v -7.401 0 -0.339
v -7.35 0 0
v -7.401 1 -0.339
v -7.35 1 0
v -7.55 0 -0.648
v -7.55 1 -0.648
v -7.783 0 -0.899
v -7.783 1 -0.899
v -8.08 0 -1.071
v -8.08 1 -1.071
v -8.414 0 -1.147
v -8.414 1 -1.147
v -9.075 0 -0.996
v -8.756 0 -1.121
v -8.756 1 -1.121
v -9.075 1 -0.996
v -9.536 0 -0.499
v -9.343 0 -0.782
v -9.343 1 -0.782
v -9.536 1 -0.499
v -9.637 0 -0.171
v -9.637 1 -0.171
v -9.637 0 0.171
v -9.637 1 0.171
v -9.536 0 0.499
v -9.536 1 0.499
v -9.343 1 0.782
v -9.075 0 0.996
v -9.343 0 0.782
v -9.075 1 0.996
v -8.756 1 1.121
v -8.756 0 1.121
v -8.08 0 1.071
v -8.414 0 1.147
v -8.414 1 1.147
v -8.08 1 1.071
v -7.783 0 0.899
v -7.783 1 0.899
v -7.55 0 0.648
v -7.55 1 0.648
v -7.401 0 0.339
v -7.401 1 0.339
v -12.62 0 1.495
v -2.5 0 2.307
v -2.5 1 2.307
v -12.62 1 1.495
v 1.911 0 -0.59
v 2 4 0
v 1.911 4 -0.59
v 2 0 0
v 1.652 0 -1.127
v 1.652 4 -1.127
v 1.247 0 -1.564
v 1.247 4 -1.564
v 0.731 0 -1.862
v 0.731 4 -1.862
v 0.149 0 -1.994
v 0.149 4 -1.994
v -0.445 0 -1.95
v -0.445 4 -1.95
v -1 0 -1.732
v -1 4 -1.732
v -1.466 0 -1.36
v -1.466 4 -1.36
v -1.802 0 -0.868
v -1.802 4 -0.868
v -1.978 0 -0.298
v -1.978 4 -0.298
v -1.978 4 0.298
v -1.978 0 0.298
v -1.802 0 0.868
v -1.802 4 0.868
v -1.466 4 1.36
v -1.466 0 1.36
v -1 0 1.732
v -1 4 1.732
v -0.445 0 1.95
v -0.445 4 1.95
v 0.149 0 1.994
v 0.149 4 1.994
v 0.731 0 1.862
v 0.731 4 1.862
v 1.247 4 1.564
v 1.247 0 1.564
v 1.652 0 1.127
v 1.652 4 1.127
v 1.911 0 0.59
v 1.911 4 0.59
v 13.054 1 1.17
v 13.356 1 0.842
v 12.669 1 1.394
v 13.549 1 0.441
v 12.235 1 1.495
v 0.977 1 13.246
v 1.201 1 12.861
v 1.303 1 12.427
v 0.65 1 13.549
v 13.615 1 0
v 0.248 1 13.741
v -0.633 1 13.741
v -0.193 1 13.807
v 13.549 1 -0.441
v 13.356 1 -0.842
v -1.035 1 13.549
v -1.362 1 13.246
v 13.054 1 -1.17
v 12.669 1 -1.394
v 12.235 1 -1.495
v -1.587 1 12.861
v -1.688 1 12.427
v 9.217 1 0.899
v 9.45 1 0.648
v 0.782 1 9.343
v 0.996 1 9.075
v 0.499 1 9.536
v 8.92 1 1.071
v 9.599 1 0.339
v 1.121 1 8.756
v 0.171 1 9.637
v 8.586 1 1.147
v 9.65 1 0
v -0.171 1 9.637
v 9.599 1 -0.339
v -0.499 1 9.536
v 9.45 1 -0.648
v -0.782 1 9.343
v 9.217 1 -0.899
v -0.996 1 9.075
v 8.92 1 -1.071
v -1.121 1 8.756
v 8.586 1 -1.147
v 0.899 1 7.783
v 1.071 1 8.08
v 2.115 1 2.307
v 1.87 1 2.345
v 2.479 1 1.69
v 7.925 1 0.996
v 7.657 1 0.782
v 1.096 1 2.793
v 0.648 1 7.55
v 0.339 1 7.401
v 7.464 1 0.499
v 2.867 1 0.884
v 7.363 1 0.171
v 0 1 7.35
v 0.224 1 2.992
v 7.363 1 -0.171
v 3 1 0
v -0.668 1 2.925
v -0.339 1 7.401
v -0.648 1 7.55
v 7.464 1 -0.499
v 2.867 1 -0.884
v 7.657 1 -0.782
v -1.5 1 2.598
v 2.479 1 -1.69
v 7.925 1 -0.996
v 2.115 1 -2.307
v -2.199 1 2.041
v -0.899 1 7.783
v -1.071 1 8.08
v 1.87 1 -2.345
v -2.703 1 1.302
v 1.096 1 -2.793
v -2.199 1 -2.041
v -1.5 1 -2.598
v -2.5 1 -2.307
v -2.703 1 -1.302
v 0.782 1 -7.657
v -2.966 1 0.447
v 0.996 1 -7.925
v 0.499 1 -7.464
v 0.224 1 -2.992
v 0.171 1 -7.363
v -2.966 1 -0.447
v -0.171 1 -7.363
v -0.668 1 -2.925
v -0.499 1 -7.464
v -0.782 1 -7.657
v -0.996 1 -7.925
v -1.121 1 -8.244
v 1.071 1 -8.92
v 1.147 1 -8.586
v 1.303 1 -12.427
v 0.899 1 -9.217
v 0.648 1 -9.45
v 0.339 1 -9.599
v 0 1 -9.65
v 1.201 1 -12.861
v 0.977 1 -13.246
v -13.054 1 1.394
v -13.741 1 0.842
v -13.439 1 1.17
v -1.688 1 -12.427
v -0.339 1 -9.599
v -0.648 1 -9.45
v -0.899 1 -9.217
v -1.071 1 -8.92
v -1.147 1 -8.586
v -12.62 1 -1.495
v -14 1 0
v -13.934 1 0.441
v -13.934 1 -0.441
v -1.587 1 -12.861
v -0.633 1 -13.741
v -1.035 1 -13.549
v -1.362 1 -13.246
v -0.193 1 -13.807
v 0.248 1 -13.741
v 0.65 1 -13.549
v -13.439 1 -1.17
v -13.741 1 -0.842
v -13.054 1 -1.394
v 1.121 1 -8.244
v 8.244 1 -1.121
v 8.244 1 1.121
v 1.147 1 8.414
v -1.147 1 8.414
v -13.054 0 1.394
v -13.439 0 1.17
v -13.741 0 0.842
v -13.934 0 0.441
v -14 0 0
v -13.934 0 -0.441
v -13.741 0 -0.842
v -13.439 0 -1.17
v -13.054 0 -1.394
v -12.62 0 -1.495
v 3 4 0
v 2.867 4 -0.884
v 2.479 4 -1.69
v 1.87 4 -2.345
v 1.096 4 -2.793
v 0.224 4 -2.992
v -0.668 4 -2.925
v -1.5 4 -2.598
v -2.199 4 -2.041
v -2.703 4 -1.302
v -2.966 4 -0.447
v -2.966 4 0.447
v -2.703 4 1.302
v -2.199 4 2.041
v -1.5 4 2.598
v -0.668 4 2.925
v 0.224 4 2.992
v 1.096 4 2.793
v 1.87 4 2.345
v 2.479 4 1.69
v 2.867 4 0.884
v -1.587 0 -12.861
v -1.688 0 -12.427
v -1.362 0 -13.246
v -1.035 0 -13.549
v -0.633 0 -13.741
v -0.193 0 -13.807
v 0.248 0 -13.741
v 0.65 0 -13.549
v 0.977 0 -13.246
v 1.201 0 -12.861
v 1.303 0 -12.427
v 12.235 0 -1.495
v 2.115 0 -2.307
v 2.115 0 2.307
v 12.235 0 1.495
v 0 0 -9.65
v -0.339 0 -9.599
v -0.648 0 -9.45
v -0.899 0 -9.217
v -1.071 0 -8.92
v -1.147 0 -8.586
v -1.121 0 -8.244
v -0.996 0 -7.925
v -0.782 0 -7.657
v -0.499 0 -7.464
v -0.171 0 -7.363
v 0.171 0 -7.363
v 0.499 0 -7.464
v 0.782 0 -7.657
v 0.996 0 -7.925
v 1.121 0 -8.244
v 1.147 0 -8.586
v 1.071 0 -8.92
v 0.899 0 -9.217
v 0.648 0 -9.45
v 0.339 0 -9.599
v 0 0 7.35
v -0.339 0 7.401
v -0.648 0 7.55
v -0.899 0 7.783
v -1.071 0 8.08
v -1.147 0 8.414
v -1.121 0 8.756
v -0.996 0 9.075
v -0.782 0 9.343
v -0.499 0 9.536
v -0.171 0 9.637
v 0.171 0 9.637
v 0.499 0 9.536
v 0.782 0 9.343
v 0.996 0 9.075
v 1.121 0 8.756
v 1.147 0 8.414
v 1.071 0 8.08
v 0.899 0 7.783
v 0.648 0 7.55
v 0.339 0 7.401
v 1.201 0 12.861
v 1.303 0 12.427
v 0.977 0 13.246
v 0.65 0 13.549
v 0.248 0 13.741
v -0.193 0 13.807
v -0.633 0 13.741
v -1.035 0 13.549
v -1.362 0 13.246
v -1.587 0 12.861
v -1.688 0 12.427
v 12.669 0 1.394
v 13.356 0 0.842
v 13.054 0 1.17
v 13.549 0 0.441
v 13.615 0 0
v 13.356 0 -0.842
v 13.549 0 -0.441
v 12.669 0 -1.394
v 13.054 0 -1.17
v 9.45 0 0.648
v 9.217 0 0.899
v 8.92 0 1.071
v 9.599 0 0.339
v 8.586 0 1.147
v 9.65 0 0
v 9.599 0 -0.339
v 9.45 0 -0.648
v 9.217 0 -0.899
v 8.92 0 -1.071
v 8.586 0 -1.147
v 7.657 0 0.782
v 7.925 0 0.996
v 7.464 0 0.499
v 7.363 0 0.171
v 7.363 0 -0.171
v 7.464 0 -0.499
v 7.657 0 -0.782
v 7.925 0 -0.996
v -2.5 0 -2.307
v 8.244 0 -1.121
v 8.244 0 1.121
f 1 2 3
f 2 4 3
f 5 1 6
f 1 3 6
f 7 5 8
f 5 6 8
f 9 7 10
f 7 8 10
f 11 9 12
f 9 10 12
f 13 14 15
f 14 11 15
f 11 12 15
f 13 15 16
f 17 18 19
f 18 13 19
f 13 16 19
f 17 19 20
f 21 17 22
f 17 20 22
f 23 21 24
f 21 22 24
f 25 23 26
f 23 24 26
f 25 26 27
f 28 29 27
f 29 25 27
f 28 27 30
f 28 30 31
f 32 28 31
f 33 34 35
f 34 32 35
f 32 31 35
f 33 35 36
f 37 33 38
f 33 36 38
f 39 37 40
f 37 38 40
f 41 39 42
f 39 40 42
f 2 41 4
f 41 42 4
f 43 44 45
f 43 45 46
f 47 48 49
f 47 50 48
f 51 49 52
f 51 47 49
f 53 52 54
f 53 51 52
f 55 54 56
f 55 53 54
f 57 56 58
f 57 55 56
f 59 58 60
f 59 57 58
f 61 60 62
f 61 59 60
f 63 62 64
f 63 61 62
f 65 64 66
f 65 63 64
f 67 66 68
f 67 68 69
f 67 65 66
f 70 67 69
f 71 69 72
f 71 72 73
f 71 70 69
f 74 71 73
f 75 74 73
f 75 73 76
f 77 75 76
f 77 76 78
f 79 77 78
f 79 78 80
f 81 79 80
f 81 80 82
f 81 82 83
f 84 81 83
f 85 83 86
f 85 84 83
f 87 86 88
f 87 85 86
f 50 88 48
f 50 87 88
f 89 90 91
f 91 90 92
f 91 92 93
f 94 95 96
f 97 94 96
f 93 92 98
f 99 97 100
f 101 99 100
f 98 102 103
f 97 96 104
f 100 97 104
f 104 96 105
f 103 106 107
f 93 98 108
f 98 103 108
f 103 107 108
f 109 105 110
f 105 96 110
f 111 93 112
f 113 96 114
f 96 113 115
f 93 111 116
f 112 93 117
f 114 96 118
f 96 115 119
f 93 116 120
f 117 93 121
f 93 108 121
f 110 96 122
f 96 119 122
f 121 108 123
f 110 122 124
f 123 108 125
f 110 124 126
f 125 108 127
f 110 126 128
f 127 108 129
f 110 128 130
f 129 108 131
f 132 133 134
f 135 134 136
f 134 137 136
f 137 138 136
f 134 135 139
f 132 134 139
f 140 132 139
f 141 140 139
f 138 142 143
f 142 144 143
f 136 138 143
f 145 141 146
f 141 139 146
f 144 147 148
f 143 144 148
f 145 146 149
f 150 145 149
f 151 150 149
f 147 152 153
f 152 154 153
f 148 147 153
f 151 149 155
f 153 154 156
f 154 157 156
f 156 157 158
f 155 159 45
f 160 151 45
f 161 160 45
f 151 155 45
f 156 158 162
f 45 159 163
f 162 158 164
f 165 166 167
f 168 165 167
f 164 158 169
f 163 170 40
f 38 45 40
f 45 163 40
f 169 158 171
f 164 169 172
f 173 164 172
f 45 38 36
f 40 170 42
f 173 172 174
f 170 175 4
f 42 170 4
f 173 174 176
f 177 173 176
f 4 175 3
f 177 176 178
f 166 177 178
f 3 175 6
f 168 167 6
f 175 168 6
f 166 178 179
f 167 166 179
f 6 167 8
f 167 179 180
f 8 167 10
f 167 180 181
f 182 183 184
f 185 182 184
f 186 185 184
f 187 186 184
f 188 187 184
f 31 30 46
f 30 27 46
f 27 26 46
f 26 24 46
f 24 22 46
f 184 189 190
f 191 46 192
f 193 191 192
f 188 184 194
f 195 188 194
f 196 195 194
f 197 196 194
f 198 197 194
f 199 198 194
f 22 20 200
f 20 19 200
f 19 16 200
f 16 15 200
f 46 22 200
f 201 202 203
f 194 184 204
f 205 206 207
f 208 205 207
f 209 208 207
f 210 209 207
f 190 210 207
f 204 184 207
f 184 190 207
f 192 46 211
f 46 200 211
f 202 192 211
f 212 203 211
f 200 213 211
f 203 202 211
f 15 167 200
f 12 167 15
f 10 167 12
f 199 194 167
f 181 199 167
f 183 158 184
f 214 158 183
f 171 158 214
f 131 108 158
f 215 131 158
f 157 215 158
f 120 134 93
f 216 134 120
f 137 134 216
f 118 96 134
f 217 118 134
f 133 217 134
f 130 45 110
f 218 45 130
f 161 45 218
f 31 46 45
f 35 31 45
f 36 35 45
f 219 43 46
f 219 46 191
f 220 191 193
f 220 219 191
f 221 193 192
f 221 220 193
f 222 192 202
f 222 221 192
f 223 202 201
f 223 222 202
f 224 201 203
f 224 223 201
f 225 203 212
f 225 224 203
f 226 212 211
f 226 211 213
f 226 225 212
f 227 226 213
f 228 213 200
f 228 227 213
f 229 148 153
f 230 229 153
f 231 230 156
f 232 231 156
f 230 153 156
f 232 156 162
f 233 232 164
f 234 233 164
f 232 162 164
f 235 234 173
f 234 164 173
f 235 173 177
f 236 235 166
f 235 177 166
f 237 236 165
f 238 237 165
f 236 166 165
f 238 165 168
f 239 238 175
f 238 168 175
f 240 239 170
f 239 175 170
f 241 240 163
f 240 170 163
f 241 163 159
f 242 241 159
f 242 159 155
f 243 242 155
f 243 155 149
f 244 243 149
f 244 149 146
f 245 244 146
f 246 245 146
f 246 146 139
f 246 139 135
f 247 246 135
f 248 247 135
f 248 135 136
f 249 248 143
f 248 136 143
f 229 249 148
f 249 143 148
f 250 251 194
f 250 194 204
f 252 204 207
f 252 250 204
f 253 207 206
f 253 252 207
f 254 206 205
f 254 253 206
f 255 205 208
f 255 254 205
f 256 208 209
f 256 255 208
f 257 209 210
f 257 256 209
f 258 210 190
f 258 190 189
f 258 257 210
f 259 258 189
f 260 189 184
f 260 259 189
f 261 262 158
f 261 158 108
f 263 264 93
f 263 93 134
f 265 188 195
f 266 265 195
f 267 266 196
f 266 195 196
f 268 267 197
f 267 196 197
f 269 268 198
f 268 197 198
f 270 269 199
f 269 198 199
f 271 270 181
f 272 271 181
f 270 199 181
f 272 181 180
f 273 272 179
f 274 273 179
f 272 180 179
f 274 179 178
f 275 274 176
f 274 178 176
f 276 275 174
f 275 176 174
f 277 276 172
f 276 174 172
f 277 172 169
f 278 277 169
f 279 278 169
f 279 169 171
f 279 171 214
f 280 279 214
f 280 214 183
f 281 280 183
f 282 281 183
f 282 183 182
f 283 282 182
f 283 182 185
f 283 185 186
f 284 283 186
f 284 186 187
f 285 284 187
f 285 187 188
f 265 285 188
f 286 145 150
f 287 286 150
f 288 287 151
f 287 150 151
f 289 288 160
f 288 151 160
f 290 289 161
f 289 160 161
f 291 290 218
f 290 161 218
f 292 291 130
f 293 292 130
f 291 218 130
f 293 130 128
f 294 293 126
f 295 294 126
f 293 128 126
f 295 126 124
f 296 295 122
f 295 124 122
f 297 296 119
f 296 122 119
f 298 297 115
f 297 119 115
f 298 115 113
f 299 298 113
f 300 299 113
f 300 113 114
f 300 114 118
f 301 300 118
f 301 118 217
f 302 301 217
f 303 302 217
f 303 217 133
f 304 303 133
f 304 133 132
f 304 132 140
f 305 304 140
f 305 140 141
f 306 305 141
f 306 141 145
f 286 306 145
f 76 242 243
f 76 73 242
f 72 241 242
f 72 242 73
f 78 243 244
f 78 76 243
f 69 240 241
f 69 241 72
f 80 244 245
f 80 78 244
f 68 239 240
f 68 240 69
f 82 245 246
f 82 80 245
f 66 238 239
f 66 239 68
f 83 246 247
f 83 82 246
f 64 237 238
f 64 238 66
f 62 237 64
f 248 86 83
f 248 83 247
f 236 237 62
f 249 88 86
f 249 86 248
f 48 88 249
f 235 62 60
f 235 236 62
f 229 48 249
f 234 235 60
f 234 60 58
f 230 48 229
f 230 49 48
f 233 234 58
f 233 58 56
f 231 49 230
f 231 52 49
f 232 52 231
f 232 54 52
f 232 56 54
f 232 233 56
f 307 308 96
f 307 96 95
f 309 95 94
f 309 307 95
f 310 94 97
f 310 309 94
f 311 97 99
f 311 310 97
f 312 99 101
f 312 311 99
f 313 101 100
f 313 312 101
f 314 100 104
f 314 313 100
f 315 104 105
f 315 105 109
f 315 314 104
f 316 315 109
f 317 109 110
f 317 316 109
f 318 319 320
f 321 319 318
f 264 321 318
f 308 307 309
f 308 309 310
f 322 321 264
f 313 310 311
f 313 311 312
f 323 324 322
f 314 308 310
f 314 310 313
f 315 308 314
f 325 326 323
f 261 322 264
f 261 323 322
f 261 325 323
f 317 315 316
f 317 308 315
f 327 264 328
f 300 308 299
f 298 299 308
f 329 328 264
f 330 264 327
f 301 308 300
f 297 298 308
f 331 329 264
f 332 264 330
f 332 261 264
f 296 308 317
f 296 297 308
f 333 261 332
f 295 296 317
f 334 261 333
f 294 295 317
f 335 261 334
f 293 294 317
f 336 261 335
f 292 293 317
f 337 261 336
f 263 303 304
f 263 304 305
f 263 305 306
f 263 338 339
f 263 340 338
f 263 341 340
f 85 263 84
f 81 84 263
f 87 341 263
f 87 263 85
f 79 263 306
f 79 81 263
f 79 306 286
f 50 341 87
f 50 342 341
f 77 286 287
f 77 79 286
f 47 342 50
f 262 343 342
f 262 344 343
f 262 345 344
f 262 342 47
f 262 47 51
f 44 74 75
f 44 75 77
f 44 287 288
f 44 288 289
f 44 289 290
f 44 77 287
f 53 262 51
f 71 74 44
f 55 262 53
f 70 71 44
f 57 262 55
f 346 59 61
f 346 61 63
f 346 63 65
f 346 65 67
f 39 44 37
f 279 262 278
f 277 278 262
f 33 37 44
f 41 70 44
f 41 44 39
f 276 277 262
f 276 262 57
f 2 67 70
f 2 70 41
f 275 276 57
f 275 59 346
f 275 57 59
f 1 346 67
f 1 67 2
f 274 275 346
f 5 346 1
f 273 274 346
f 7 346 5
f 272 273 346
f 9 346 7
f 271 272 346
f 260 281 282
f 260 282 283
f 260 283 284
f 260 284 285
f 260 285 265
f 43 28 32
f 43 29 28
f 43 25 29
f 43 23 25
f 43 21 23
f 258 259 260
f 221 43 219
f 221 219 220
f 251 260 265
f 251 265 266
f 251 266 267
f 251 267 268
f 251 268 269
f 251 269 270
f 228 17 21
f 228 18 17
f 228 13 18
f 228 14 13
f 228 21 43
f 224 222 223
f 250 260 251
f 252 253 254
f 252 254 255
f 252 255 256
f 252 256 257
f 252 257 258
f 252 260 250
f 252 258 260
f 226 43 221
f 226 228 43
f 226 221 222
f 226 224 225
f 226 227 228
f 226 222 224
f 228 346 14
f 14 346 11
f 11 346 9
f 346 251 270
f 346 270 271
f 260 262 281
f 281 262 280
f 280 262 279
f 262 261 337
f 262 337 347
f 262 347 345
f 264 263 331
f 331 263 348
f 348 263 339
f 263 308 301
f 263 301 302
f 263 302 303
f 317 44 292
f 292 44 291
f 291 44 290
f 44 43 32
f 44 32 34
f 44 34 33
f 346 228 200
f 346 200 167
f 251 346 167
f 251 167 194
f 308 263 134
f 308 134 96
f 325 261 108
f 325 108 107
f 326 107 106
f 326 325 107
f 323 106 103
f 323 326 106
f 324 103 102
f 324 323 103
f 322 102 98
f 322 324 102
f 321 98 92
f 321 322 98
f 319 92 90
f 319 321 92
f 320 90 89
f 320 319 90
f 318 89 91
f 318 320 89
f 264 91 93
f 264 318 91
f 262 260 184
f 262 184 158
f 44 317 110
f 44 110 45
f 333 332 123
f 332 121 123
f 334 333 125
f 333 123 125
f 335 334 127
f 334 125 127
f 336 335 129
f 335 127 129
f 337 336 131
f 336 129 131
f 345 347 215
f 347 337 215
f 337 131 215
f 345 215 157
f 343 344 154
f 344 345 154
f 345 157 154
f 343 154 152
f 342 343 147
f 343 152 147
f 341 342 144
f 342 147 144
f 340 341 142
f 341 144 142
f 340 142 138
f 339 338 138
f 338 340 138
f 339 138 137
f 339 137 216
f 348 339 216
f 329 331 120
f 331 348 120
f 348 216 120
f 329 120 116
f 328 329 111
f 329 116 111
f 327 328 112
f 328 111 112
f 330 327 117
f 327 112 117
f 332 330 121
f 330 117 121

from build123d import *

# Parameters (mm, degrees)
SKICA1_R                 = 2
P_IDAT_VYSUNUT_M1_DEPTH  = 1
SKICA2_R                 = 1.15
ODEBRAT_VYSUNUT_M1_DEPTH = 2
SKICA3_R                 = 3
SKICA3_R_2               = 2
P_IDAT_VYSUNUT_M2_DEPTH  = 3
KRUHOV_POLE1_COUNT       = 4


with BuildPart() as part:
    # Skica1 → Přidat vysunutím1 (new body)
    with BuildSketch(Plane(origin=(0, 0, 0), x_dir=(1, 0, 0), z_dir=(0, 1, 0))):
        with BuildLine():
            Line((-12.62, 1.495192295), (-2.5, 2.307395517))
            Line((-2.5, 2.307395517), (-1.687796778, 12.427395517))
            ThreePointArc((-1.687796778, 12.427395517), (-0.192604483, 13.807395517), (1.302587813, 12.427395517))
            Line((1.302587813, 12.427395517), (2.114791035, 2.307395517))
            Line((2.114791035, 2.307395517), (12.234791035, 1.495192295))
            ThreePointArc((12.234791035, 1.495192295), (13.614791035, 0), (12.234791035, -1.495192295))
            Line((12.234791035, -1.495192295), (2.114791035, -2.307395517))
            Line((2.114791035, -2.307395517), (1.302587813, -12.427395517))
            ThreePointArc((1.302587813, -12.427395517), (-0.192604483, -13.807395517), (-1.687796778, -12.427395517))
            Line((-1.687796778, -12.427395517), (-2.5, -2.307395517))
            Line((-2.5, -2.307395517), (-12.62, -1.495192295))
            ThreePointArc((-12.62, -1.495192295), (-14, 0), (-12.62, 1.495192295))
        make_face()
        Circle(SKICA1_R, mode=Mode.SUBTRACT)
    extrude(amount=P_IDAT_VYSUNUT_M1_DEPTH)

    # Skica2 → Odebrat vysunutím1 (cut)
    with BuildSketch(Plane(origin=(0, 1, 0), x_dir=(1, 0, 0), z_dir=(0, 1, 0))):
        with Locations((-8.5, 0)):
            Circle(SKICA2_R)
        with Locations((8.5, 0)):
            Circle(SKICA2_R)
    odebrat_vysunut_m1 = extrude(amount=-ODEBRAT_VYSUNUT_M1_DEPTH, mode=Mode.SUBTRACT)

    # Skica3 → Přidat vysunutím2 (add)
    with BuildSketch(Plane(origin=(0, 1, 0), x_dir=(1, 0, 0), z_dir=(0, 1, 0))):
        Circle(SKICA3_R)
        Circle(SKICA3_R_2, mode=Mode.SUBTRACT)
    extrude(amount=P_IDAT_VYSUNUT_M2_DEPTH)

    # Kruhové pole1: Odebrat vysunutím1 ×4 about axis
    kruhov_pole1_axis = Axis((0, 0, 0), (0, 1, 0))
    for i in range(1, KRUHOV_POLE1_COUNT):
        add(odebrat_vysunut_m1.rotate(kruhov_pole1_axis, i * 360 / KRUHOV_POLE1_COUNT), mode=Mode.SUBTRACT)


solid = part.part
